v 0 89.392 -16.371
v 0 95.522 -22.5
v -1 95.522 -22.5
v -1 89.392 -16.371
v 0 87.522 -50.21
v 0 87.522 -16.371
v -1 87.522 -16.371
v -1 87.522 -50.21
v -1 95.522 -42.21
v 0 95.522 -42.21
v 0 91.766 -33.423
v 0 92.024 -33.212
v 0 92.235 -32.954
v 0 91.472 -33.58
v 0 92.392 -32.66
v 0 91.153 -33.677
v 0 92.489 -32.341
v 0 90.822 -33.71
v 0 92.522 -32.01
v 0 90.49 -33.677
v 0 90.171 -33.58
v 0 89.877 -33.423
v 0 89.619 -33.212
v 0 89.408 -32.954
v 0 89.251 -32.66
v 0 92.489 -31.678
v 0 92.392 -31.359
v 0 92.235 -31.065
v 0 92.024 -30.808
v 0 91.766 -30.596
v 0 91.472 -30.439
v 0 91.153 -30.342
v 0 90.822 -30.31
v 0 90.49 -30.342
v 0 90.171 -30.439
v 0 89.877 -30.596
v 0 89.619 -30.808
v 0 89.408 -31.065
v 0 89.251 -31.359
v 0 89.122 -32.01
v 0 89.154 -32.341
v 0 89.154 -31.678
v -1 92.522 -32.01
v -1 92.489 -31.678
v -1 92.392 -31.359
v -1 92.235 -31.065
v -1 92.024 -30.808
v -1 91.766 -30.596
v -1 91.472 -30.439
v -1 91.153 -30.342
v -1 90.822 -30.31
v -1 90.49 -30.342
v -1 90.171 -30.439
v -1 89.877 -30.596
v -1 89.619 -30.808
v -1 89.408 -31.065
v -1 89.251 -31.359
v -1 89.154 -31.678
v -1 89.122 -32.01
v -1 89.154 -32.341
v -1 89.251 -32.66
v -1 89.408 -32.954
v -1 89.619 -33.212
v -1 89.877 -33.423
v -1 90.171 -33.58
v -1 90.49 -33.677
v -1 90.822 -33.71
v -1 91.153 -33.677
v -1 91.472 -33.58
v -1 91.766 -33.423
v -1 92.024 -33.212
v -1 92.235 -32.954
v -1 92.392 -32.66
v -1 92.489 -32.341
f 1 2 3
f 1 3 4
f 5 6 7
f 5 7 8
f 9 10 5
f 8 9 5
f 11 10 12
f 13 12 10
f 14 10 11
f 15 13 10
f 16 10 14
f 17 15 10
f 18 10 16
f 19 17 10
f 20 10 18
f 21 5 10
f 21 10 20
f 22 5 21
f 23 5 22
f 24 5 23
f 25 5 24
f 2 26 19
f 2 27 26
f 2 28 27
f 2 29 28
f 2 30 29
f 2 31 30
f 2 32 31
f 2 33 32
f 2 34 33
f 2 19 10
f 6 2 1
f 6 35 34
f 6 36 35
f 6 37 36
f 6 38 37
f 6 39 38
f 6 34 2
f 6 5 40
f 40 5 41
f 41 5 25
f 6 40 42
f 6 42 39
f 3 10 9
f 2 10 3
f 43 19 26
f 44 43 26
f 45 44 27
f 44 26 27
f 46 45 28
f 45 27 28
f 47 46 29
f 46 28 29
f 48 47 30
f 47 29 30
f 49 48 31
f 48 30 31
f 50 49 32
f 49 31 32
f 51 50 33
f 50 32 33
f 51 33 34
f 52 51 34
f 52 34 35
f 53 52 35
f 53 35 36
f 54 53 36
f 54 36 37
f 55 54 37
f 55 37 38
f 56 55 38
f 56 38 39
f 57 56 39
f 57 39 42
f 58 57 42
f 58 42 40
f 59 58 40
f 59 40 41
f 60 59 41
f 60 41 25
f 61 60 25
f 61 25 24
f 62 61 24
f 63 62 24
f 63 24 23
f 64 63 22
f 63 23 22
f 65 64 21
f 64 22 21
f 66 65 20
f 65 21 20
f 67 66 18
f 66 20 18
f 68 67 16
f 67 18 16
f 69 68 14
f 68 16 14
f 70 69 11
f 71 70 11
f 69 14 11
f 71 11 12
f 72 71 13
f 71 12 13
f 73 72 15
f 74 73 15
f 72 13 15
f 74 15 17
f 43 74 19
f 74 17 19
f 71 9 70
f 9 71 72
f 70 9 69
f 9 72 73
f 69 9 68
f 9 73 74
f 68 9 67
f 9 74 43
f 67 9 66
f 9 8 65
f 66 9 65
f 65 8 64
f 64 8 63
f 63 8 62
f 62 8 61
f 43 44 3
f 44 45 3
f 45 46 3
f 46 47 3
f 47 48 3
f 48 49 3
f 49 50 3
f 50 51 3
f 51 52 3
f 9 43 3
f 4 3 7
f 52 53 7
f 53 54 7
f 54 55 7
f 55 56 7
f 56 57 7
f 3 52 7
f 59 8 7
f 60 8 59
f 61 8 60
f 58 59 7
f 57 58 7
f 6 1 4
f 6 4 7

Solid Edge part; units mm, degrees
sketch "Sketch1" plane through (0, 0, 0) normal (1, 0, 0) x (0, 1, 0)
  line L0 (95.5215, -16.3706) -> (87.5215, -16.3706)
  line L1 (87.5215, -16.3706) -> (87.5215, -57.067)
  line L2 (87.5215, -57.067) -> (95.5215, -57.067)
  line L3 (95.5215, -57.067) -> (95.5215, -16.3706)
  circle A0 centre (90.8215, -32.0096) radius 1.7
  dimension "D1" = 8
extrude "Protrusion1" add sketch "Sketch1" against normal blind 1
sketch "Sketch2" plane through (0, 91.5215, -36.7188) normal (1, 0, 0) x (0, 0, 1)
  line L0 (-5.4908, -4) -> (-25.4908, 16)
  line L1 (-25.4908, 16) -> (-24.9247, -9.9187)
  line L2 (-24.9247, -9.9187) -> (-5.4908, -4)
  line L3 (14.2188, -4) -> (34.2188, 16)
  line L4 (34.2188, 16) -> (29.5856, -11.0555)
  line L5 (29.5856, -11.0555) -> (14.2188, -4)
extrude "ExtrudedCutout_1" cut sketch "Sketch2" against normal blind 36
